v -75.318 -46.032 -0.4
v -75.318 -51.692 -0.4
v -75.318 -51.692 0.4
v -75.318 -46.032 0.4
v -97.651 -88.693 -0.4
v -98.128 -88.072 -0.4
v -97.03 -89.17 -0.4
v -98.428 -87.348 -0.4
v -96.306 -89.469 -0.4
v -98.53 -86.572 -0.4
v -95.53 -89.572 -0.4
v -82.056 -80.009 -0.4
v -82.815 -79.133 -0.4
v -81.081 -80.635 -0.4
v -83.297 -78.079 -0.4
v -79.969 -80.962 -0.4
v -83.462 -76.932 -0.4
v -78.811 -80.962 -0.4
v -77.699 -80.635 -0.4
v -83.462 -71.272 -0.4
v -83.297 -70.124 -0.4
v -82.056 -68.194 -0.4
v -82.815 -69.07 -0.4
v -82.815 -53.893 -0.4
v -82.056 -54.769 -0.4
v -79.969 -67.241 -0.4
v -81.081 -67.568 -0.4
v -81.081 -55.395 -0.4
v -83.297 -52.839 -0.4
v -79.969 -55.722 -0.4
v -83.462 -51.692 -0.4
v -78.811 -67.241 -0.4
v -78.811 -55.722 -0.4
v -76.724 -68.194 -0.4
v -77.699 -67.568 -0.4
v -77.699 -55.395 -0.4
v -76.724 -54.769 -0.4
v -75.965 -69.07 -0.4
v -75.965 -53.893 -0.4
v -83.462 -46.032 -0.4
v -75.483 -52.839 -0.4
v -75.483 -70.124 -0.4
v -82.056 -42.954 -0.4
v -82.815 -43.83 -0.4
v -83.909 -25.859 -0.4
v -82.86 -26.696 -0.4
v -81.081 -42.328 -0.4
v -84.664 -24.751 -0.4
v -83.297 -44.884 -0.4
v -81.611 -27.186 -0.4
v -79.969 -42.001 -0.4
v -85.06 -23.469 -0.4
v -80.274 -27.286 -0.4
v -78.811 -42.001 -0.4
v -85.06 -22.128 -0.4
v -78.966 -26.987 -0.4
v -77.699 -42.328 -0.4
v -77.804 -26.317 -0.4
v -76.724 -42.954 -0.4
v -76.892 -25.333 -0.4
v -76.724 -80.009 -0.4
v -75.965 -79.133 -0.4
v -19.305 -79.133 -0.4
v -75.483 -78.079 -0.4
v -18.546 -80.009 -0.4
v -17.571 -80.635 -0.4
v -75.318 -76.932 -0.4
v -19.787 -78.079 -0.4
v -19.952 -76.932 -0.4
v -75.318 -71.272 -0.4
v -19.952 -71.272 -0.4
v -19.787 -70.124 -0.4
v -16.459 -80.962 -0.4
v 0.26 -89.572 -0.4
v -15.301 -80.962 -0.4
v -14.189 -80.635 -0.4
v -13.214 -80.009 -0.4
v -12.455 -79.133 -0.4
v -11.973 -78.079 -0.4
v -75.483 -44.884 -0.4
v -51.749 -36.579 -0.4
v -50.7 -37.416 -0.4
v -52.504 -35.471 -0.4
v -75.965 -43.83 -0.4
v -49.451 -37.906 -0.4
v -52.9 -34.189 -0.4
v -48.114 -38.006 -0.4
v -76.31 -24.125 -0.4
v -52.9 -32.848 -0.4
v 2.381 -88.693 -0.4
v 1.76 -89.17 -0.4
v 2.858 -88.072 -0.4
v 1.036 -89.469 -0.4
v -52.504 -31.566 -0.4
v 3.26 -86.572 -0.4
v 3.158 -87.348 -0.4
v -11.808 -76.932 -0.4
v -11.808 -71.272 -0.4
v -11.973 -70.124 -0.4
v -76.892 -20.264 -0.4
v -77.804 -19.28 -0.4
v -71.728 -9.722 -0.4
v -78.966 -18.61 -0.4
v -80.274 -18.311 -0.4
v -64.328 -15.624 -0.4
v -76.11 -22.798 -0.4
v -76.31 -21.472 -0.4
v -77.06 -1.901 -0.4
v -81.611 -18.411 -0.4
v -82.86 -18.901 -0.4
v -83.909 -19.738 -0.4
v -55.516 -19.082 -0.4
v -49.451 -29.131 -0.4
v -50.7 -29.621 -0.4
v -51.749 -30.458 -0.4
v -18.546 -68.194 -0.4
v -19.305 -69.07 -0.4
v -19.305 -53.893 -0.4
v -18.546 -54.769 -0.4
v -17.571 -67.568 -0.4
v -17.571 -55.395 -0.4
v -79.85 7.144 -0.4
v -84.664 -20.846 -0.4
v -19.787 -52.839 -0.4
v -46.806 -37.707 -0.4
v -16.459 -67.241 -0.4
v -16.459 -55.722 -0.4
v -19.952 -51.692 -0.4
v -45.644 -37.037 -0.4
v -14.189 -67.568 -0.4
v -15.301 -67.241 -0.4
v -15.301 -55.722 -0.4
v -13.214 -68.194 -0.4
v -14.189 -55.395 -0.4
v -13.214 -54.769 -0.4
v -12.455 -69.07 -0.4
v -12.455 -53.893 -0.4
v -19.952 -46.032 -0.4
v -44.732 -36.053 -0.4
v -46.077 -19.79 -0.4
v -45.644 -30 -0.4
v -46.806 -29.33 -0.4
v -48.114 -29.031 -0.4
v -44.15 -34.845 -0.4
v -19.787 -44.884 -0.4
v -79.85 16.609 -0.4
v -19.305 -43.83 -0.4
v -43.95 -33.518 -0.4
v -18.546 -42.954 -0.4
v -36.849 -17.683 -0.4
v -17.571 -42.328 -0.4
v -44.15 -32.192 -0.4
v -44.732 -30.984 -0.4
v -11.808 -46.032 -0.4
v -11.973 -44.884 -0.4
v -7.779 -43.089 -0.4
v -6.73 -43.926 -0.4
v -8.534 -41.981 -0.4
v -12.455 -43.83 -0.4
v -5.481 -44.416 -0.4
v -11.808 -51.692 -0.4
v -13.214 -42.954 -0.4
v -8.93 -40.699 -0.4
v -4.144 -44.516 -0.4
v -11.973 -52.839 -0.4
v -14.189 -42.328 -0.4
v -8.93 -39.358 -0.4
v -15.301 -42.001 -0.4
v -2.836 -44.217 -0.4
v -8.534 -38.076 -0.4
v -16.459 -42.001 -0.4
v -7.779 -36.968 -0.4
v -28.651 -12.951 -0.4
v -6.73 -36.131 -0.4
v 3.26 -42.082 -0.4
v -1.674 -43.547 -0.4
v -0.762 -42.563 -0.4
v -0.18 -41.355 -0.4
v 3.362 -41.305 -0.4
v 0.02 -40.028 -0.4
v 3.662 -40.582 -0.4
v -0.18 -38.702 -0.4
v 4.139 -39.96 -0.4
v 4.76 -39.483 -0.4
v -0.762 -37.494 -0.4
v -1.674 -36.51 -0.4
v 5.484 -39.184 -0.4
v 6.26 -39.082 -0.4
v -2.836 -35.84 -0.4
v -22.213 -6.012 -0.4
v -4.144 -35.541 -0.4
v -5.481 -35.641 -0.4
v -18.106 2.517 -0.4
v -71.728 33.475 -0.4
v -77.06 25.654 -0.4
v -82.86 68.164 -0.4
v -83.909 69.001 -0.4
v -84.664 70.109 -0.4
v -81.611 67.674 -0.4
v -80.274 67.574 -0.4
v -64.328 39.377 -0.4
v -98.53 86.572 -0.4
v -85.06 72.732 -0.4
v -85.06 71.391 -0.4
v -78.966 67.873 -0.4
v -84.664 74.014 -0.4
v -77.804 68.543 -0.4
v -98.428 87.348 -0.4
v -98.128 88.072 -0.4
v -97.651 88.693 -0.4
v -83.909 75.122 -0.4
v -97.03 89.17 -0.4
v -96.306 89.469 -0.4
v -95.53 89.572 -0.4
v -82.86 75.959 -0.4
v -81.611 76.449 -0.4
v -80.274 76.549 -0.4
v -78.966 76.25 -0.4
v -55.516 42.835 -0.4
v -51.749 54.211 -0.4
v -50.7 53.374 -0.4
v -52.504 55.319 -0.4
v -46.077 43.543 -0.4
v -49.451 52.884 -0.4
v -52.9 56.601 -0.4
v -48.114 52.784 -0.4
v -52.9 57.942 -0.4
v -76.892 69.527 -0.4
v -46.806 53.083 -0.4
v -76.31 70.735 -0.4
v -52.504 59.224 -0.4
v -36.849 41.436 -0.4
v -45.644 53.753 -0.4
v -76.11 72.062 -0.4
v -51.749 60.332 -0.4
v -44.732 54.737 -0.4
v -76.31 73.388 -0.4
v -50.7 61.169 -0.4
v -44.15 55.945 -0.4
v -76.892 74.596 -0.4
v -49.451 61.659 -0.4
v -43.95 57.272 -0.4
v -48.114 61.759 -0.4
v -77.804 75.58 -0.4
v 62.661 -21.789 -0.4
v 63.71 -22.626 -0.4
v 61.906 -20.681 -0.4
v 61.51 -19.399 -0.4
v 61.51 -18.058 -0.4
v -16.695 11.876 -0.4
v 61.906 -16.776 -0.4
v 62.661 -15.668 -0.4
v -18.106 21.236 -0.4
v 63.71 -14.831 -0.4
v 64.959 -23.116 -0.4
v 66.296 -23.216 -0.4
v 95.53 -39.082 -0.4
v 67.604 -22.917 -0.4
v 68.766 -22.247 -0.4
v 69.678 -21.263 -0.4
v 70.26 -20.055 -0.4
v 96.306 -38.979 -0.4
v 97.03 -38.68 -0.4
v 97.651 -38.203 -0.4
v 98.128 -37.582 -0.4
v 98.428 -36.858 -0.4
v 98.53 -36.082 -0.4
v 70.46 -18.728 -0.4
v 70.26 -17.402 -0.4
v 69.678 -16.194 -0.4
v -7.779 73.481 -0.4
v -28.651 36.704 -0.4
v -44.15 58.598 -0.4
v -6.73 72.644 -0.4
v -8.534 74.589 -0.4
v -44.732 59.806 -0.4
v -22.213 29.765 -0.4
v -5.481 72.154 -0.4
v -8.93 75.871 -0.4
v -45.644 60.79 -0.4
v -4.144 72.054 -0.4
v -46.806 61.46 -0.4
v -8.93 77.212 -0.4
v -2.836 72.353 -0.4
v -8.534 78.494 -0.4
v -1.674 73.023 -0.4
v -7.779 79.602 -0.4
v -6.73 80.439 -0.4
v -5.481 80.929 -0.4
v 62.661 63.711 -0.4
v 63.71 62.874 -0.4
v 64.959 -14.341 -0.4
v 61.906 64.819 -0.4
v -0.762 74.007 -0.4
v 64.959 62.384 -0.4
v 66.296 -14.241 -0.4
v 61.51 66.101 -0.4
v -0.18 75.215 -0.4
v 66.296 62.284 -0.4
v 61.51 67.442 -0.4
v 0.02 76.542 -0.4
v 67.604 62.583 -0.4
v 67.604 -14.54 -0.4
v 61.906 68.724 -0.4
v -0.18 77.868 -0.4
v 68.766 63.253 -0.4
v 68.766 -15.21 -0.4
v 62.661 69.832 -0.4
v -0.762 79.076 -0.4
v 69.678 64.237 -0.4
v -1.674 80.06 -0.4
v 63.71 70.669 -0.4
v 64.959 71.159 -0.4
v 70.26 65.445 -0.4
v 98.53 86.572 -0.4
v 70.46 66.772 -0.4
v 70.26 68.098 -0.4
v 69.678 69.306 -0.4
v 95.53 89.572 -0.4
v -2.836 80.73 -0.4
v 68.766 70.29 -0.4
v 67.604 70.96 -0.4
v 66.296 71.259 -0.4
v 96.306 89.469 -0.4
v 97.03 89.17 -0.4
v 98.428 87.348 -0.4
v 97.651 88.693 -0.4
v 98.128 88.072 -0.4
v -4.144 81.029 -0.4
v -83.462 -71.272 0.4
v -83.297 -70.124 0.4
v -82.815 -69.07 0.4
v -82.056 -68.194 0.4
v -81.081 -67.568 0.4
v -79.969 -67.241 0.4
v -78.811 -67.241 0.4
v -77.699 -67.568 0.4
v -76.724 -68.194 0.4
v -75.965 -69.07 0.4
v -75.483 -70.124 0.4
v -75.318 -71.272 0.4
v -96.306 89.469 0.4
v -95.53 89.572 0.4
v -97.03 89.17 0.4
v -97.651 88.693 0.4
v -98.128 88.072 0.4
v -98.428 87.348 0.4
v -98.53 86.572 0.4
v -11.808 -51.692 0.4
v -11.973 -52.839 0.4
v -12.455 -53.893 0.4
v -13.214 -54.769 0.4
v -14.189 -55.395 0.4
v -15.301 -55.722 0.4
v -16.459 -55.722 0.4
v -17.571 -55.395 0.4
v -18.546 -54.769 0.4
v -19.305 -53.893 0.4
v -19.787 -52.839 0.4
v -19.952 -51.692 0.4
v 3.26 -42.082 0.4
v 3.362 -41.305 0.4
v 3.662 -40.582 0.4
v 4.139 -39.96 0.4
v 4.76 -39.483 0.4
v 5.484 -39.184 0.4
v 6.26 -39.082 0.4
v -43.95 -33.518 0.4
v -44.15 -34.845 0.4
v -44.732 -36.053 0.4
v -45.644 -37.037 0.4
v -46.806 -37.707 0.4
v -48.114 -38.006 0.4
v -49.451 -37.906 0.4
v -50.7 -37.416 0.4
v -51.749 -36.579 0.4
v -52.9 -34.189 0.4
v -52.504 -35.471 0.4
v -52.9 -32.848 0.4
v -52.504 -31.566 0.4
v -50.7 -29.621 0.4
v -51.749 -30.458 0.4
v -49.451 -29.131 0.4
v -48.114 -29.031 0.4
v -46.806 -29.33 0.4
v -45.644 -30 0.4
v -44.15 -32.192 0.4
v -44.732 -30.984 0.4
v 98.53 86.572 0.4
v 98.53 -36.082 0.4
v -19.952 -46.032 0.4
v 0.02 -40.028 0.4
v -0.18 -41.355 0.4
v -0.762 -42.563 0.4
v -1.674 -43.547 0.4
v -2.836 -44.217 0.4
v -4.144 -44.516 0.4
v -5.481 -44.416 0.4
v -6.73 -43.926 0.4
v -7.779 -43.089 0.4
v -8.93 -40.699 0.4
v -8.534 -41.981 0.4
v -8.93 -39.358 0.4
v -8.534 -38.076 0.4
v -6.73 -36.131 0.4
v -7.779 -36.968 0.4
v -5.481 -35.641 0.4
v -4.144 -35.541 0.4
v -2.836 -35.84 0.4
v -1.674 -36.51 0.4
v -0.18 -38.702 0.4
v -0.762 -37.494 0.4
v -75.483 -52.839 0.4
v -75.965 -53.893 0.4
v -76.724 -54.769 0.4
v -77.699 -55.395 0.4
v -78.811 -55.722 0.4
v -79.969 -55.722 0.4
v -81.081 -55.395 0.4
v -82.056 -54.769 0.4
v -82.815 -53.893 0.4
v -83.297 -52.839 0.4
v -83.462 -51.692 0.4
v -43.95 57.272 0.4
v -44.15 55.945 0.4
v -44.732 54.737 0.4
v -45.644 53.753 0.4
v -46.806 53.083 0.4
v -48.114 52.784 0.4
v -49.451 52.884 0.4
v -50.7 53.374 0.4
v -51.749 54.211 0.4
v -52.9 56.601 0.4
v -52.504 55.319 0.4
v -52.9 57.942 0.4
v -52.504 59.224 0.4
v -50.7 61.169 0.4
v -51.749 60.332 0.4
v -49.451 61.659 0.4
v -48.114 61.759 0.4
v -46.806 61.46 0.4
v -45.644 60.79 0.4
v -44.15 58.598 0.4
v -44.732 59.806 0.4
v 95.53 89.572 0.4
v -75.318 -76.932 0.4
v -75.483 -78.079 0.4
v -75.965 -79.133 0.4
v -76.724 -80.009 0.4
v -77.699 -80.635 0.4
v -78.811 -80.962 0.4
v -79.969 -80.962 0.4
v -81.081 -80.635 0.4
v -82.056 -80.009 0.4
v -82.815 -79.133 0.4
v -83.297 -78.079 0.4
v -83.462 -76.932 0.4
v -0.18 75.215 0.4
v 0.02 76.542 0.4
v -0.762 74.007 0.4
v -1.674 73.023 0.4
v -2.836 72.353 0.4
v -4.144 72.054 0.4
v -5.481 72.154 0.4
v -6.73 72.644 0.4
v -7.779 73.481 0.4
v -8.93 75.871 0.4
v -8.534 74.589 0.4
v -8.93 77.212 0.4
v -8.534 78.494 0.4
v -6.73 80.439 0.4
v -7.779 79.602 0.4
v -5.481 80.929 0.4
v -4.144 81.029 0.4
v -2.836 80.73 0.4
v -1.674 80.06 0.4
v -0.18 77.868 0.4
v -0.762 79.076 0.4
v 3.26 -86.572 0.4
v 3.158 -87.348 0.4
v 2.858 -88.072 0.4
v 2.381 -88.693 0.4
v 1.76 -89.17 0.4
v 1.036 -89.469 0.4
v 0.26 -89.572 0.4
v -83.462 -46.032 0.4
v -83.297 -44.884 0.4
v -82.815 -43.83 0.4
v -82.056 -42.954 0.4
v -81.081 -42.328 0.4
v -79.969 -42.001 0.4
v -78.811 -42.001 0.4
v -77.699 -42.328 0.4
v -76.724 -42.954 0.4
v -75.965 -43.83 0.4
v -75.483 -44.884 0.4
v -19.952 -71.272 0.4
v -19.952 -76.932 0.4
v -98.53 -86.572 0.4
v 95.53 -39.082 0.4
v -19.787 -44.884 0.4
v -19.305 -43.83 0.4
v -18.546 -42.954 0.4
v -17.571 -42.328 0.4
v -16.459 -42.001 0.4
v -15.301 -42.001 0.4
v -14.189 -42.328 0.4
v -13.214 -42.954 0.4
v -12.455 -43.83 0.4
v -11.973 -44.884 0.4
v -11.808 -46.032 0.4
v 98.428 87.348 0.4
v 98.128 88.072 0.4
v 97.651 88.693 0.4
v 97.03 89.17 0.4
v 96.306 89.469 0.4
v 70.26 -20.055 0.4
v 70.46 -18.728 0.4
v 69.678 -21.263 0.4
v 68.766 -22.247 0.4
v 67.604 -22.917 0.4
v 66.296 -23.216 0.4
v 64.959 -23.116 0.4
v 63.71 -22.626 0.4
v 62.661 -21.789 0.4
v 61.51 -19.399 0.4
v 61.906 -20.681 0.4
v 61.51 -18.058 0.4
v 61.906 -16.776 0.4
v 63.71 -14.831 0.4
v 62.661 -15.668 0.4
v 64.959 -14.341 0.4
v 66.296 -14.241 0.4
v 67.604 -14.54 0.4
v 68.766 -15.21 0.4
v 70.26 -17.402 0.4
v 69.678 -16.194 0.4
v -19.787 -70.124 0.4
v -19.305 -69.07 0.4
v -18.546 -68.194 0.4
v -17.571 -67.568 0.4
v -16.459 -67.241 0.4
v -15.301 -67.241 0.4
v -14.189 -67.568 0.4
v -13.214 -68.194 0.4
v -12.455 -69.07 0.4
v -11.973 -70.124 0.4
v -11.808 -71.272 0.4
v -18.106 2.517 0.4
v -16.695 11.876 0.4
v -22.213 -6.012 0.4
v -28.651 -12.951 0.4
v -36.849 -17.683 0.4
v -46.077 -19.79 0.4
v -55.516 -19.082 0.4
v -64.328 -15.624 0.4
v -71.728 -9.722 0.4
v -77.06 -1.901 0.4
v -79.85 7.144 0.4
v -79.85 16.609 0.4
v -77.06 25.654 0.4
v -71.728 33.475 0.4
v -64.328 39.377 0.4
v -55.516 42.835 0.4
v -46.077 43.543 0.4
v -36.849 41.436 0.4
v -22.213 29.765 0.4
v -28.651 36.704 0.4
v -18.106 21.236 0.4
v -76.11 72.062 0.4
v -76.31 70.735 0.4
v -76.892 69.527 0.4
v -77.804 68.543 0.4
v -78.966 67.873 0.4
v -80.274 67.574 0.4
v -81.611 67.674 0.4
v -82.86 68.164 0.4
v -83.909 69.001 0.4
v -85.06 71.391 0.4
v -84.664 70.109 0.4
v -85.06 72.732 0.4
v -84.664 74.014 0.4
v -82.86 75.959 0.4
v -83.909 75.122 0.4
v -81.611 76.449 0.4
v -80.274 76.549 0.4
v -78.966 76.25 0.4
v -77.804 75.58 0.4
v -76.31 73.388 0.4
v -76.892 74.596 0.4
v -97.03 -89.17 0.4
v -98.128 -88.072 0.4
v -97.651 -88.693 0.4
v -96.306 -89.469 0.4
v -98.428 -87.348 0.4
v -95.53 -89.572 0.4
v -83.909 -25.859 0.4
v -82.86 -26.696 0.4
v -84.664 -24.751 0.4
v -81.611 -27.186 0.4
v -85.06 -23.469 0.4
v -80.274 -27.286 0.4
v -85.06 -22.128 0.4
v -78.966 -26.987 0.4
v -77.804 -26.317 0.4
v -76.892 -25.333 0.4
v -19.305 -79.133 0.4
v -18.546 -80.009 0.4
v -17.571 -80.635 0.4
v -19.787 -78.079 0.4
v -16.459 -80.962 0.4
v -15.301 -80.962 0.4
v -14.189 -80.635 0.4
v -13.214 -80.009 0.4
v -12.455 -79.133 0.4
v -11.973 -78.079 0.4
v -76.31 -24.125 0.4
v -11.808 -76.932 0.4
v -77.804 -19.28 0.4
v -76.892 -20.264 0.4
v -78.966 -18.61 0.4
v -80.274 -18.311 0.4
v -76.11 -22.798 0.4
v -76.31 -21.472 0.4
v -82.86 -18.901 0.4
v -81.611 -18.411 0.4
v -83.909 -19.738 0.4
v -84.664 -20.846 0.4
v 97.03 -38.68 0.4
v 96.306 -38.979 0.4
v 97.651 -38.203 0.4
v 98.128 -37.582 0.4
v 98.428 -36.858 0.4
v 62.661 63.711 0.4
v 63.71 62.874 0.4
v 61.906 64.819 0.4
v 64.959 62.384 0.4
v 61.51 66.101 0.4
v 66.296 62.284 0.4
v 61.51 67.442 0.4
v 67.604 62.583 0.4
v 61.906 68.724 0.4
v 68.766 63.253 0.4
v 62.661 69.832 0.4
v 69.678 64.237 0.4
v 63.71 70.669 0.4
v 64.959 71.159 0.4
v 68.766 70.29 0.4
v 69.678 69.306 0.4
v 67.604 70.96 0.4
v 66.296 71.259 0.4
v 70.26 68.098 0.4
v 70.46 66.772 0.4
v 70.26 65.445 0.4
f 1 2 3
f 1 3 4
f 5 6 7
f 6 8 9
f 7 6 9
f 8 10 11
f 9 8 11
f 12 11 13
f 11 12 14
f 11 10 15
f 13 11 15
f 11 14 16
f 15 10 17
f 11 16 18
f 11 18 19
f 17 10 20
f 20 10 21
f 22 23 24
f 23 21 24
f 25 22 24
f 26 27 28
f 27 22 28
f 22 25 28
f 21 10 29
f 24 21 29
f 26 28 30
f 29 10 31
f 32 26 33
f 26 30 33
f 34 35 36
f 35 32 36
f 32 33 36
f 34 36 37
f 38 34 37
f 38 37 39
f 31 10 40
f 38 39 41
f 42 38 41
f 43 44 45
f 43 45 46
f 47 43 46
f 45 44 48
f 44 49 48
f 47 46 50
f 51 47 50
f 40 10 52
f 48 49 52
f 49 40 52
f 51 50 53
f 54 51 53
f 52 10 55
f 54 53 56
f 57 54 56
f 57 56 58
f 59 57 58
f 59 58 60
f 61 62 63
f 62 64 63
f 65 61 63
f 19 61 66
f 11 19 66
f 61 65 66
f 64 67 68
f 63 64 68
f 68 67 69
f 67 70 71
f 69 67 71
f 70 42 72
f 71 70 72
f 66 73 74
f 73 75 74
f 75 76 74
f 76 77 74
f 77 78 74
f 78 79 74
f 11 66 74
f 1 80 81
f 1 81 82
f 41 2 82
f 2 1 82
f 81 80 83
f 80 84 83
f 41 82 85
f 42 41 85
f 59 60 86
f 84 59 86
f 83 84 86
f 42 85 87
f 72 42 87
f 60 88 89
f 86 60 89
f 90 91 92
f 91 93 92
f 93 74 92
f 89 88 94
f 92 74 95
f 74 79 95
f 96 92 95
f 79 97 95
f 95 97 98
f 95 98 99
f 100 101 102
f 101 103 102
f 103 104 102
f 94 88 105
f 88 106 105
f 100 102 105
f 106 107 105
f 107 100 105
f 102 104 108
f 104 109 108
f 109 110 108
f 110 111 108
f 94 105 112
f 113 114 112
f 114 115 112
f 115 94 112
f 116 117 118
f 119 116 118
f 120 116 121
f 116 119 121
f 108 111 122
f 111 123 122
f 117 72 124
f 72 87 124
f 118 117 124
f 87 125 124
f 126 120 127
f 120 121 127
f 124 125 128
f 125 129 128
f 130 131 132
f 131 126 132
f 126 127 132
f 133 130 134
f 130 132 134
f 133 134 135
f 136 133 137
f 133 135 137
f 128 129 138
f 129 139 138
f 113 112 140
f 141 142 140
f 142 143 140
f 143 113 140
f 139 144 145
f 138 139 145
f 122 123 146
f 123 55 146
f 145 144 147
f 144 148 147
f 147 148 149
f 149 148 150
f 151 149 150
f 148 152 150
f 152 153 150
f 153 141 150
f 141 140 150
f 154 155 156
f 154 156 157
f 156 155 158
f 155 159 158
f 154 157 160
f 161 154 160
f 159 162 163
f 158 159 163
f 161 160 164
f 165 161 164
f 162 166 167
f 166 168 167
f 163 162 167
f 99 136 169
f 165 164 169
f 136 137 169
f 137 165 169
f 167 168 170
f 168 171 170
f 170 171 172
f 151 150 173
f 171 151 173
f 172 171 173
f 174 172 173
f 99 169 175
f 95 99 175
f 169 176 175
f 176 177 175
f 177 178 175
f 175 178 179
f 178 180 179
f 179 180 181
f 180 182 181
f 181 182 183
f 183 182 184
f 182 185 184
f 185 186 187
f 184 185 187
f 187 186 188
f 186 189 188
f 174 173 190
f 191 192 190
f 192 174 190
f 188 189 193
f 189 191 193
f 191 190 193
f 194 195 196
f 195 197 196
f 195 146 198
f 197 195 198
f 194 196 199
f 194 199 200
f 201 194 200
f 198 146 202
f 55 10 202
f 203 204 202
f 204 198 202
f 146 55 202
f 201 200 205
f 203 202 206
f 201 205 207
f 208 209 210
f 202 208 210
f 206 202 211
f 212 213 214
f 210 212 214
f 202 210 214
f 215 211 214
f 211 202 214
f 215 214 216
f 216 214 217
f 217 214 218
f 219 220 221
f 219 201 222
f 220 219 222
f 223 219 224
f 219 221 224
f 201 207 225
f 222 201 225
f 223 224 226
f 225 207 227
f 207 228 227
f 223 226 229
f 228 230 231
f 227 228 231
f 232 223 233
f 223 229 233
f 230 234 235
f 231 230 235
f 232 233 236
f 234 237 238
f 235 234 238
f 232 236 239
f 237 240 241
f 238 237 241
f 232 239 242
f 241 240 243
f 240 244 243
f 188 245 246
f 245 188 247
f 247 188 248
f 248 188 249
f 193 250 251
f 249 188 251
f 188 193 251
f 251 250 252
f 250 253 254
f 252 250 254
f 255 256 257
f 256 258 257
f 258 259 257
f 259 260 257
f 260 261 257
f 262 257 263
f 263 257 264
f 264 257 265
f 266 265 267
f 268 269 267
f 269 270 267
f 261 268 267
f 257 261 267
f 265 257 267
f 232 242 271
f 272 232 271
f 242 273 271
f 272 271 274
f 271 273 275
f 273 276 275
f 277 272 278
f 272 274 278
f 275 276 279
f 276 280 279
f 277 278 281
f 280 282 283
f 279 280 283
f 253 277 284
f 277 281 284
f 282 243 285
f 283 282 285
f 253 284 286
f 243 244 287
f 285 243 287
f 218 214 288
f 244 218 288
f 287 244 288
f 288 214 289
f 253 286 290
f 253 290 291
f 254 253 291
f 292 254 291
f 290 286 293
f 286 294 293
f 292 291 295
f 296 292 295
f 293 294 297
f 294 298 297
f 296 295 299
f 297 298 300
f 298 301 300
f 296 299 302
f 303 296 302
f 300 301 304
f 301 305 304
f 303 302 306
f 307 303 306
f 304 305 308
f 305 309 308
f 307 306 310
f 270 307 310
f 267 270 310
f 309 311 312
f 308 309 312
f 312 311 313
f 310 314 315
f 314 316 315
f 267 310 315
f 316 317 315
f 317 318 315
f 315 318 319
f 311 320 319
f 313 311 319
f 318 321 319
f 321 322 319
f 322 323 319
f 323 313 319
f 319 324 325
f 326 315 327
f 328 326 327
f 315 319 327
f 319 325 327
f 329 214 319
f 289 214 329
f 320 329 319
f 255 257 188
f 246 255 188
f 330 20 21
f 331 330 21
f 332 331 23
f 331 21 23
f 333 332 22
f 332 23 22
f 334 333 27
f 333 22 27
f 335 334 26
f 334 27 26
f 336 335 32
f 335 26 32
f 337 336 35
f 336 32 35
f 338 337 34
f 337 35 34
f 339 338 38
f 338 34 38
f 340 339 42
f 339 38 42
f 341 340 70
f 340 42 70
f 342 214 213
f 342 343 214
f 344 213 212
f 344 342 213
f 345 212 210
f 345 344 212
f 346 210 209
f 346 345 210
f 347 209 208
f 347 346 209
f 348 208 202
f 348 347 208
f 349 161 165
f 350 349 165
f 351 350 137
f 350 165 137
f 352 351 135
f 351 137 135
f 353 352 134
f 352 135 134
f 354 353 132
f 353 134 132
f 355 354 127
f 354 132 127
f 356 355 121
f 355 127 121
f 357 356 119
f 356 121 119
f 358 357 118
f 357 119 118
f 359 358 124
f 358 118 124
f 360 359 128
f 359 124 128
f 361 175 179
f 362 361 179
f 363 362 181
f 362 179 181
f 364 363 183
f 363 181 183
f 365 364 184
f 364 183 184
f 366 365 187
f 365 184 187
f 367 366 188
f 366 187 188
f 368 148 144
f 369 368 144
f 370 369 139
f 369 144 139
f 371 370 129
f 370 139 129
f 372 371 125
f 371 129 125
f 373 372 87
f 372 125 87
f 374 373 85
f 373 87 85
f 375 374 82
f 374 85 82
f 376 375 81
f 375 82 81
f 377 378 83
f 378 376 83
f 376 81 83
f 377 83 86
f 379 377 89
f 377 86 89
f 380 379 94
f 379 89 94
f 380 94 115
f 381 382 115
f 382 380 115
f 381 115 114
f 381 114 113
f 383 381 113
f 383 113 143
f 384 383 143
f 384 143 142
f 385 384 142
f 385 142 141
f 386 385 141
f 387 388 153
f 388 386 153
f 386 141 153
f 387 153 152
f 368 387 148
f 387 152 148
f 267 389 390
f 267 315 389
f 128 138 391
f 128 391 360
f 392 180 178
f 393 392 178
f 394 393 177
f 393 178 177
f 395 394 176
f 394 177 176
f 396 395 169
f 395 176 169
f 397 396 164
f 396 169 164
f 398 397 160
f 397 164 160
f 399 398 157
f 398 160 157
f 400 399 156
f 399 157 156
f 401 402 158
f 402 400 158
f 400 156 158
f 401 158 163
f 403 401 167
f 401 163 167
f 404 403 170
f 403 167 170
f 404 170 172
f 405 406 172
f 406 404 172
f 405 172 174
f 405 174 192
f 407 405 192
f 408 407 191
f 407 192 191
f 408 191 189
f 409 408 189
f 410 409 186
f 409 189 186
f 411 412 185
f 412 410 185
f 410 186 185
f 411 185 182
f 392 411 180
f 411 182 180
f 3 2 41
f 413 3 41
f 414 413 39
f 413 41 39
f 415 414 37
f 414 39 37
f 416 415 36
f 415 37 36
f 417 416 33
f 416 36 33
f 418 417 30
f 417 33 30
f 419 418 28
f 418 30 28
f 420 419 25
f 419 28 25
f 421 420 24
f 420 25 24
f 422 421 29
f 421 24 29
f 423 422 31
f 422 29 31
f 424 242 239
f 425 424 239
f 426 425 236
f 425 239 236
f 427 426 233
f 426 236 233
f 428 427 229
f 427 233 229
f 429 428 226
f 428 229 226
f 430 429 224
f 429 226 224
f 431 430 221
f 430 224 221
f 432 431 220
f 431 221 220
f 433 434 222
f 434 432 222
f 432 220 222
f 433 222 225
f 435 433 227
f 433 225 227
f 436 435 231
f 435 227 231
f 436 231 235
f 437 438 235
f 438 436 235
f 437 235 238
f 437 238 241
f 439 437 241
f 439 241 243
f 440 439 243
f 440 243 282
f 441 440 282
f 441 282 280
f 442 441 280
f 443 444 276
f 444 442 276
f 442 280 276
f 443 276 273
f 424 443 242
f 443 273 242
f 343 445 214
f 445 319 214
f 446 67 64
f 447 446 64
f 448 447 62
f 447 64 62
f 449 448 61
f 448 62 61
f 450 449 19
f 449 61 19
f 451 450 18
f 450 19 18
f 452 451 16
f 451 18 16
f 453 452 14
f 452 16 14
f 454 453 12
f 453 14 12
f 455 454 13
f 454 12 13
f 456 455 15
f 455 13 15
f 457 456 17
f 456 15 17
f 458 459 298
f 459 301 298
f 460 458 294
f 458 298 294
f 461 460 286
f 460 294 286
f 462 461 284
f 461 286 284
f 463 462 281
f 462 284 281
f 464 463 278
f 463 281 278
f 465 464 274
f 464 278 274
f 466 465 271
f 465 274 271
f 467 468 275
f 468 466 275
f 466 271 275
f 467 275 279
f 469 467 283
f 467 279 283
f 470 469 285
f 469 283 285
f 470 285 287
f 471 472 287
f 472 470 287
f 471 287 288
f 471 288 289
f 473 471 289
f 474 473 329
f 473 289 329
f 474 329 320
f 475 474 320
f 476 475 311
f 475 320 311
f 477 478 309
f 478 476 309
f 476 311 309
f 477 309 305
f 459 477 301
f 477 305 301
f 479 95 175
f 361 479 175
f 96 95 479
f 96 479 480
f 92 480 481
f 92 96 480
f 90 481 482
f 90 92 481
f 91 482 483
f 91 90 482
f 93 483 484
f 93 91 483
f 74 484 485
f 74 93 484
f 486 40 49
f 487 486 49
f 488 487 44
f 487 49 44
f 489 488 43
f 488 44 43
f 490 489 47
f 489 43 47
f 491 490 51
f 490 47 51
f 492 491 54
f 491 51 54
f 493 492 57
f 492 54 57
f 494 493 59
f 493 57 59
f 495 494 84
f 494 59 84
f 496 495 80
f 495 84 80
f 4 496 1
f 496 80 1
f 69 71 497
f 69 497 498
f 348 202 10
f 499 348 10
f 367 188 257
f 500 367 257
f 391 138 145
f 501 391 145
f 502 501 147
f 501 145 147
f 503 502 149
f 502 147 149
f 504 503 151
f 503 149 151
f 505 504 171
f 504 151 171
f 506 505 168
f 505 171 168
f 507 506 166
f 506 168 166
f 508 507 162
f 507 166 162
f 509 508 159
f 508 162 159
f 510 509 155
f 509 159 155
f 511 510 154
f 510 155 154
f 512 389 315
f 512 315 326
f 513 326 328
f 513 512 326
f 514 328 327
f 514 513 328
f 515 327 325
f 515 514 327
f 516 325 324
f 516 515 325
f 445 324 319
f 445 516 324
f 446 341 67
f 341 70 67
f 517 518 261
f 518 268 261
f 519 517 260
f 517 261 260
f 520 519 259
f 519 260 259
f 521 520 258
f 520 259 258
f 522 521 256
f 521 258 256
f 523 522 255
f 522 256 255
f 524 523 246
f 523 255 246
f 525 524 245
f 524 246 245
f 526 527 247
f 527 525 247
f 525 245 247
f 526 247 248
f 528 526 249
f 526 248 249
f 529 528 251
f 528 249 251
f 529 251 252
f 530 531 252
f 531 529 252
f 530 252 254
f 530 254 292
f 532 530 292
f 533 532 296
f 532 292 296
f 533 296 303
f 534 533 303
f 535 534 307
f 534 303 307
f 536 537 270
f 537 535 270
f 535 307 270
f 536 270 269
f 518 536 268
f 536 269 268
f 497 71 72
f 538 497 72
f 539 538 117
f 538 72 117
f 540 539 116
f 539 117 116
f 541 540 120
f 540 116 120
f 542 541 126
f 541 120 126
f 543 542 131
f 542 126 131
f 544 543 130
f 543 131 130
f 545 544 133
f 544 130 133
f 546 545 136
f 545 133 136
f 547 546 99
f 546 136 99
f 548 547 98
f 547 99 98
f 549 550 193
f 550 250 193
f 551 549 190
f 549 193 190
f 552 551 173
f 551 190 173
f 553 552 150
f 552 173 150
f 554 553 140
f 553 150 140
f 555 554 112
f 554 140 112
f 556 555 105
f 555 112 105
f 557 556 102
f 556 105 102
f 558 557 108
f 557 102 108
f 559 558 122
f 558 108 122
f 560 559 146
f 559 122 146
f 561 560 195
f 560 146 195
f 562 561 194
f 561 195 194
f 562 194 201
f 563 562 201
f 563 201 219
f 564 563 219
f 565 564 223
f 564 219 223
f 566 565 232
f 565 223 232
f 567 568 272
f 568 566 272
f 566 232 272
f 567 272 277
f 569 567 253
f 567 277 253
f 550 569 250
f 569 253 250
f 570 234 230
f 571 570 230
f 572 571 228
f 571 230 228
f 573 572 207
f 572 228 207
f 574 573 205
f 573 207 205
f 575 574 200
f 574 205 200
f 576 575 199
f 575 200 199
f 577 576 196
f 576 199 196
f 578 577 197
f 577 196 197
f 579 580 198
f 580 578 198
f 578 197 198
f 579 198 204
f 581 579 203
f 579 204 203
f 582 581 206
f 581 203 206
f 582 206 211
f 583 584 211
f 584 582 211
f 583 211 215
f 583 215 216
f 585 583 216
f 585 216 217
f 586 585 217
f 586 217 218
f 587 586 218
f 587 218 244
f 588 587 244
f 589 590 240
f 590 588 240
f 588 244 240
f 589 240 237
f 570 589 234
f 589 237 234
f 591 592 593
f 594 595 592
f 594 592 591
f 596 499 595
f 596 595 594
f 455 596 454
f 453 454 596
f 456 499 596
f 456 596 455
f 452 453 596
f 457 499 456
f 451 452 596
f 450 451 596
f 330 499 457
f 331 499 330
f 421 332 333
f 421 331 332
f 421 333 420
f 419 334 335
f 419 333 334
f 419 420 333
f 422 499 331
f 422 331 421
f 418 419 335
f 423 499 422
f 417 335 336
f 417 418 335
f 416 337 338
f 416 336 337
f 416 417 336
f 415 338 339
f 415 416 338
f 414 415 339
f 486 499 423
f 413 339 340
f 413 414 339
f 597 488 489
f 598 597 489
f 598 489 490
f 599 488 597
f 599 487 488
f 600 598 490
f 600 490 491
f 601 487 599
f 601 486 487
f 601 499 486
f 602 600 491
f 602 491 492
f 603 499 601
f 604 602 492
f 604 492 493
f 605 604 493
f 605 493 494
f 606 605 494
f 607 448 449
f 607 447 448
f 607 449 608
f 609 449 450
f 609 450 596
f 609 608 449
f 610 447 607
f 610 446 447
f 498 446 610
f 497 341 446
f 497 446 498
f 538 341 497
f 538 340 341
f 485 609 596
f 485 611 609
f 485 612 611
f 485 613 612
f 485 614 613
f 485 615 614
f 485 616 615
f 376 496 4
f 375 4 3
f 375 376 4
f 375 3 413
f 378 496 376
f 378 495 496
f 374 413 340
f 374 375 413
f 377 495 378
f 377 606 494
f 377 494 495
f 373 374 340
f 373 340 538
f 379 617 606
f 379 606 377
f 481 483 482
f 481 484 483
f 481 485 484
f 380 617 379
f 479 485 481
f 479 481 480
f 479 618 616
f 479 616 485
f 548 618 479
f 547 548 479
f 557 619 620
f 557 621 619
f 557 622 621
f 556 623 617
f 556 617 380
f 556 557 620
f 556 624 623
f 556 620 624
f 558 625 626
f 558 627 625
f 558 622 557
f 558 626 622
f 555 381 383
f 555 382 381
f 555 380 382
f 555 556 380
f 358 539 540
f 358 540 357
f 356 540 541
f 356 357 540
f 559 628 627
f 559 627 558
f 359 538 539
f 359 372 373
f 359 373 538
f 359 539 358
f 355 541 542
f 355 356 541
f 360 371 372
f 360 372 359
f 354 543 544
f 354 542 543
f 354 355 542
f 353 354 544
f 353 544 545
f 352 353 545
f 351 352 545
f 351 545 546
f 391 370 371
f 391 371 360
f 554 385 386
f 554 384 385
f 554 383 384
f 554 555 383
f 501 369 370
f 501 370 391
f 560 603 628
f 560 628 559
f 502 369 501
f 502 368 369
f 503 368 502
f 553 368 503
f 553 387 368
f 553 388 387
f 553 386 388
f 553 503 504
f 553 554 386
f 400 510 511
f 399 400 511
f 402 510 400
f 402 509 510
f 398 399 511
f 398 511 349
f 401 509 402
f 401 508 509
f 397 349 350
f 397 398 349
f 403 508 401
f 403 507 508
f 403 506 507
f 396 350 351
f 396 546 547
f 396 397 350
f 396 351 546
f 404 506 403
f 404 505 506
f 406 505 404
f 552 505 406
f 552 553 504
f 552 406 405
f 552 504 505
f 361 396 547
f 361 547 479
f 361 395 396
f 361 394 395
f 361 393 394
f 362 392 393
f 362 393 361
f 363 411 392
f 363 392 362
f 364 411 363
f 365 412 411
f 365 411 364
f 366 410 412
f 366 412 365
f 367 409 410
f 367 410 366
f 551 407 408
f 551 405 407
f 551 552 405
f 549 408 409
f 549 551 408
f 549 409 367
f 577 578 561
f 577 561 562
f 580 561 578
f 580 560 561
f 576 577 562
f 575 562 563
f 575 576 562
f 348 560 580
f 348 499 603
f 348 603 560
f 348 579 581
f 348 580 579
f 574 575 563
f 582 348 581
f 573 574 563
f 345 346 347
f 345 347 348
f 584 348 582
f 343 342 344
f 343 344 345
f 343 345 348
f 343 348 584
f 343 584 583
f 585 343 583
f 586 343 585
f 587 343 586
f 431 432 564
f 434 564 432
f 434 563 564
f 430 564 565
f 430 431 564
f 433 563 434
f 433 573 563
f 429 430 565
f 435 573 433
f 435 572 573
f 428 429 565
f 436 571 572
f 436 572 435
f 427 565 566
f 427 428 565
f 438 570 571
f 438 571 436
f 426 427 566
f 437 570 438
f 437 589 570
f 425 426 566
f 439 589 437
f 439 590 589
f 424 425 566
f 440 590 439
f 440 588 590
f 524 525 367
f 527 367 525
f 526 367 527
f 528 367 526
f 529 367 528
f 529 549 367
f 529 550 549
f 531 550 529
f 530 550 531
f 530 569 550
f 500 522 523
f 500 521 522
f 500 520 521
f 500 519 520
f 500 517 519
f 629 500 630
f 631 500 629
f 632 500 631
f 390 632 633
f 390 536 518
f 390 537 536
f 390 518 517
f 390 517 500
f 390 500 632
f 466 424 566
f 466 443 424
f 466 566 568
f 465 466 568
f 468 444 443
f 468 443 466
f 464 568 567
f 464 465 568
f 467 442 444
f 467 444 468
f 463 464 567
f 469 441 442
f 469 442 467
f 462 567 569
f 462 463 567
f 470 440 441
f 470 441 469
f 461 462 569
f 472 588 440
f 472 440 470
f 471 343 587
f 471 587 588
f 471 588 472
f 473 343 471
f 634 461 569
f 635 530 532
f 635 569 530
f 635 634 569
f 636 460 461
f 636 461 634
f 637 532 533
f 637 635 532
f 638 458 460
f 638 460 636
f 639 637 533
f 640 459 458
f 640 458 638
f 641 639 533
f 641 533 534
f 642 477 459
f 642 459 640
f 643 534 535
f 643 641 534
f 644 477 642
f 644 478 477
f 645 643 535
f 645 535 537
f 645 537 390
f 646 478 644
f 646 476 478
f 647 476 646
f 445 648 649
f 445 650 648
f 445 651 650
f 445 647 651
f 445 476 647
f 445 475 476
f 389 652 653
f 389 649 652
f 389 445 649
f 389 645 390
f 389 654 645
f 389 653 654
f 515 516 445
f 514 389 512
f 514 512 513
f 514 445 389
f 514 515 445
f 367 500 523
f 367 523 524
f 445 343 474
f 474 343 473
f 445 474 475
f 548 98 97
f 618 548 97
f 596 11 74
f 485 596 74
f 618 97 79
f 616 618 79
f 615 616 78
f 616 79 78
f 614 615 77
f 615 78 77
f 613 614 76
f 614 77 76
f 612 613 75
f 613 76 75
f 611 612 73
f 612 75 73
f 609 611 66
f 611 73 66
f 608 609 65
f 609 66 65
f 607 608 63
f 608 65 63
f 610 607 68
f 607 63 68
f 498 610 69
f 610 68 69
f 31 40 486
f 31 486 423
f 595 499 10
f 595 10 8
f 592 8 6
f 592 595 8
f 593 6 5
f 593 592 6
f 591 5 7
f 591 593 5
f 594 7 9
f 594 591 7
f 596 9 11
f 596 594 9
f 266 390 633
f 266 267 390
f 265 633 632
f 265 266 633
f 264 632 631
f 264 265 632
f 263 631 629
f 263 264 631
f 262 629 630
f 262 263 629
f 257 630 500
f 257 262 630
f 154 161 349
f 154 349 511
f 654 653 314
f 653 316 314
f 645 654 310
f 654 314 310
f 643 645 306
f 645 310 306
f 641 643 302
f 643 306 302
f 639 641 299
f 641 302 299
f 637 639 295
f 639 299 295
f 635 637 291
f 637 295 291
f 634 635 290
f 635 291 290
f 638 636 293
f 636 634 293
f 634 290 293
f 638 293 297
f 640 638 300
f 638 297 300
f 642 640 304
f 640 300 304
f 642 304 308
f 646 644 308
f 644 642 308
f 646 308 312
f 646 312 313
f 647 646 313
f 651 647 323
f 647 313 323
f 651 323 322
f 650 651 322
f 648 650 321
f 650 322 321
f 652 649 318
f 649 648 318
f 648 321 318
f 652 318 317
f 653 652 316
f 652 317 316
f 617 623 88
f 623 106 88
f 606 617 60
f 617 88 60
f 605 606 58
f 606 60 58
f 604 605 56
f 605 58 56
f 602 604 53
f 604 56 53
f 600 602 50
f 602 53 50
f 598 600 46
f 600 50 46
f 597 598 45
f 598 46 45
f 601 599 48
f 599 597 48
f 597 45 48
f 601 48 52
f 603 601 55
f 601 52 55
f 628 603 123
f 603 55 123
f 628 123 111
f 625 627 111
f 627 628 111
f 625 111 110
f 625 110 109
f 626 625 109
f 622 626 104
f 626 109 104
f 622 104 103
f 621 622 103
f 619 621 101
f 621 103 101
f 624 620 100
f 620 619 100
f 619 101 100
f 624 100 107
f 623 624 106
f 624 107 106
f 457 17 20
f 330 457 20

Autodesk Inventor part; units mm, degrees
ref_plane "YZ Plane" through (0, 0, 0) normal (1, 0, 0) x (0, 1, 0)
ref_plane "XZ Plane" through (0, 0, 0) normal (0, 1, 0) x (-1, 0, 0)
ref_plane "XY Plane" through (0, 0, 0) normal (0, 0, 1) x (1, 0, 0)
sketch "Boceto1" plane through (0, 0, 0) normal (0, 0, 1) x (1, 0, 0)
  line L0 (98.53, 89.5715) -> (-98.53, 89.5715)
  line L1 (-98.53, -89.5715) -> (98.53, 89.5715) construction
  line L2 (98.53, -89.5715) -> (-98.53, 89.5715) construction
  line L3 (3.26, -89.5715) -> (3.26, -39.0815)
  line L4 (3.26, -39.0815) -> (98.53, -39.0815)
  line L5 (98.53, 89.5715) -> (98.53, -39.0815)
  circle A0 centre (65.96, 66.7715) radius 4.5
  circle A1 centre (65.96, -18.7285) radius 4.5
  circle A2 centre (-80.61, 72.0615) radius 4.5
  circle A3 centre (-4.48, 76.5415) radius 4.5
  circle A4 centre (-80.61, -22.7985) radius 4.5
  circle A5 centre (-4.48, -40.0285) radius 4.5
  circle A6 centre (-48.45, -33.5185) radius 4.5
  circle A7 centre (-48.45, 57.2715) radius 4.5
  circle A8 centre (-48.45, 11.8765) radius 31.755
  line L6 (-83.4615, -46.0315) -> (-83.4615, -51.6915)
  line L7 (-75.3185, -51.6915) -> (-75.3185, -46.0315)
  line L8 (-83.4615, -76.9315) -> (-83.4615, -71.2715)
  line L9 (-75.3185, -71.2715) -> (-75.3185, -76.9315)
  arc A9 (-75.3185, -46.0315) -> (-83.4615, -46.0315) centre (-79.39, -46.0315) ccw
  arc A10 (-83.4615, -51.6915) -> (-75.3185, -51.6915) centre (-79.39, -51.6915) ccw
  arc A11 (-75.3185, -71.2715) -> (-83.4615, -71.2715) centre (-79.39, -71.2715) ccw
  arc A12 (-83.4615, -76.9315) -> (-75.3185, -76.9315) centre (-79.39, -76.9315) ccw
  line L10 (-19.9515, -46.0315) -> (-19.9515, -51.6915)
  line L11 (-11.8085, -51.6915) -> (-11.8085, -46.0315)
  line L12 (-19.9515, -71.2715) -> (-19.9515, -76.9315)
  line L13 (-11.8085, -71.2715) -> (-11.8085, -76.9315)
  arc A13 (-11.8085, -46.0315) -> (-19.9515, -46.0315) centre (-15.88, -46.0315) ccw
  arc A14 (-19.9515, -51.6915) -> (-11.8085, -51.6915) centre (-15.88, -51.6915) ccw
  arc A15 (-11.8085, -71.2715) -> (-19.9515, -71.2715) centre (-15.88, -71.2715) ccw
  arc A16 (-19.9515, -76.9315) -> (-11.8085, -76.9315) centre (-15.88, -76.9315) ccw
  line L14 (-98.53, 89.5715) -> (-98.53, -89.5715)
  line L15 (-98.53, -89.5715) -> (3.26, -89.5715)
  point P0 (0, 0)
  dimension "d6" = 9
  dimension "d8" = 9
  dimension "d13" = 9
  dimension "d14" = 9
  dimension "d18" = 9
  dimension "d19" = 9
  dimension "d22" = 9
  dimension "d24" = 9
  dimension "d26" = 63.51
extrude "Extrusión1" add sketch "Boceto1" along normal mid plane 0.8
fillet "Empalme1" radius 3 6 edges at (98.53, 89.5715, 0) (98.53, -39.0815, 0) (3.26, -89.5715, 0) (3.26, -39.0815, 0) (-98.53, -89.5715, 0) (-98.53, 89.5715, 0)
